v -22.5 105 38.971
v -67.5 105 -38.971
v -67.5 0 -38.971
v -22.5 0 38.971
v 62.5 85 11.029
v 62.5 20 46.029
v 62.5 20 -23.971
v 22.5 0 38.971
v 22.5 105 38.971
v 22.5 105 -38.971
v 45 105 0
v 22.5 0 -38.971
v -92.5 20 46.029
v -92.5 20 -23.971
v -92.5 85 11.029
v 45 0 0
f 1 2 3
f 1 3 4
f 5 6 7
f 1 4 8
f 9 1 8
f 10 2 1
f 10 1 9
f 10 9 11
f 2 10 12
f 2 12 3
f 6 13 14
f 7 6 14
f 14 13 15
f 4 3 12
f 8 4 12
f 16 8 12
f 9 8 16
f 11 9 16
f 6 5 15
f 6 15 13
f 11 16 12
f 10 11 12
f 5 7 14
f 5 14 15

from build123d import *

# Parameters (mm, degrees)
EXTRUDE1_DEPTH = 105
EXTRUDE2_START = 62.5
EXTRUDE2_DEPTH = 155


with BuildPart() as part:
    # Sketch1 → Extrude1 (new body)
    with BuildSketch(Plane(origin=(0, 0, 0), x_dir=(1, 0, 0), z_dir=(0, 1, 0))):
        Polygon((45, 0), (22.5, 38.97114317), (-67.5, 38.97114317), (-22.5, -38.97114317), (22.5, -38.97114317), align=None)
    extrude(amount=EXTRUDE1_DEPTH)


with BuildPart() as body_2:
    # Sketch2 → Extrude2 (new body)
    with BuildSketch(Plane(origin=(0, 0, 0), x_dir=(0, 0, -1), z_dir=(1, 0, 0)).offset(EXTRUDE2_START)):
        Polygon((-46.02885683, 20), (23.97114317, 20), (-11.02885683, 85), align=None)
    extrude(amount=-EXTRUDE2_DEPTH)


solid = Compound([part.part, body_2.part])
